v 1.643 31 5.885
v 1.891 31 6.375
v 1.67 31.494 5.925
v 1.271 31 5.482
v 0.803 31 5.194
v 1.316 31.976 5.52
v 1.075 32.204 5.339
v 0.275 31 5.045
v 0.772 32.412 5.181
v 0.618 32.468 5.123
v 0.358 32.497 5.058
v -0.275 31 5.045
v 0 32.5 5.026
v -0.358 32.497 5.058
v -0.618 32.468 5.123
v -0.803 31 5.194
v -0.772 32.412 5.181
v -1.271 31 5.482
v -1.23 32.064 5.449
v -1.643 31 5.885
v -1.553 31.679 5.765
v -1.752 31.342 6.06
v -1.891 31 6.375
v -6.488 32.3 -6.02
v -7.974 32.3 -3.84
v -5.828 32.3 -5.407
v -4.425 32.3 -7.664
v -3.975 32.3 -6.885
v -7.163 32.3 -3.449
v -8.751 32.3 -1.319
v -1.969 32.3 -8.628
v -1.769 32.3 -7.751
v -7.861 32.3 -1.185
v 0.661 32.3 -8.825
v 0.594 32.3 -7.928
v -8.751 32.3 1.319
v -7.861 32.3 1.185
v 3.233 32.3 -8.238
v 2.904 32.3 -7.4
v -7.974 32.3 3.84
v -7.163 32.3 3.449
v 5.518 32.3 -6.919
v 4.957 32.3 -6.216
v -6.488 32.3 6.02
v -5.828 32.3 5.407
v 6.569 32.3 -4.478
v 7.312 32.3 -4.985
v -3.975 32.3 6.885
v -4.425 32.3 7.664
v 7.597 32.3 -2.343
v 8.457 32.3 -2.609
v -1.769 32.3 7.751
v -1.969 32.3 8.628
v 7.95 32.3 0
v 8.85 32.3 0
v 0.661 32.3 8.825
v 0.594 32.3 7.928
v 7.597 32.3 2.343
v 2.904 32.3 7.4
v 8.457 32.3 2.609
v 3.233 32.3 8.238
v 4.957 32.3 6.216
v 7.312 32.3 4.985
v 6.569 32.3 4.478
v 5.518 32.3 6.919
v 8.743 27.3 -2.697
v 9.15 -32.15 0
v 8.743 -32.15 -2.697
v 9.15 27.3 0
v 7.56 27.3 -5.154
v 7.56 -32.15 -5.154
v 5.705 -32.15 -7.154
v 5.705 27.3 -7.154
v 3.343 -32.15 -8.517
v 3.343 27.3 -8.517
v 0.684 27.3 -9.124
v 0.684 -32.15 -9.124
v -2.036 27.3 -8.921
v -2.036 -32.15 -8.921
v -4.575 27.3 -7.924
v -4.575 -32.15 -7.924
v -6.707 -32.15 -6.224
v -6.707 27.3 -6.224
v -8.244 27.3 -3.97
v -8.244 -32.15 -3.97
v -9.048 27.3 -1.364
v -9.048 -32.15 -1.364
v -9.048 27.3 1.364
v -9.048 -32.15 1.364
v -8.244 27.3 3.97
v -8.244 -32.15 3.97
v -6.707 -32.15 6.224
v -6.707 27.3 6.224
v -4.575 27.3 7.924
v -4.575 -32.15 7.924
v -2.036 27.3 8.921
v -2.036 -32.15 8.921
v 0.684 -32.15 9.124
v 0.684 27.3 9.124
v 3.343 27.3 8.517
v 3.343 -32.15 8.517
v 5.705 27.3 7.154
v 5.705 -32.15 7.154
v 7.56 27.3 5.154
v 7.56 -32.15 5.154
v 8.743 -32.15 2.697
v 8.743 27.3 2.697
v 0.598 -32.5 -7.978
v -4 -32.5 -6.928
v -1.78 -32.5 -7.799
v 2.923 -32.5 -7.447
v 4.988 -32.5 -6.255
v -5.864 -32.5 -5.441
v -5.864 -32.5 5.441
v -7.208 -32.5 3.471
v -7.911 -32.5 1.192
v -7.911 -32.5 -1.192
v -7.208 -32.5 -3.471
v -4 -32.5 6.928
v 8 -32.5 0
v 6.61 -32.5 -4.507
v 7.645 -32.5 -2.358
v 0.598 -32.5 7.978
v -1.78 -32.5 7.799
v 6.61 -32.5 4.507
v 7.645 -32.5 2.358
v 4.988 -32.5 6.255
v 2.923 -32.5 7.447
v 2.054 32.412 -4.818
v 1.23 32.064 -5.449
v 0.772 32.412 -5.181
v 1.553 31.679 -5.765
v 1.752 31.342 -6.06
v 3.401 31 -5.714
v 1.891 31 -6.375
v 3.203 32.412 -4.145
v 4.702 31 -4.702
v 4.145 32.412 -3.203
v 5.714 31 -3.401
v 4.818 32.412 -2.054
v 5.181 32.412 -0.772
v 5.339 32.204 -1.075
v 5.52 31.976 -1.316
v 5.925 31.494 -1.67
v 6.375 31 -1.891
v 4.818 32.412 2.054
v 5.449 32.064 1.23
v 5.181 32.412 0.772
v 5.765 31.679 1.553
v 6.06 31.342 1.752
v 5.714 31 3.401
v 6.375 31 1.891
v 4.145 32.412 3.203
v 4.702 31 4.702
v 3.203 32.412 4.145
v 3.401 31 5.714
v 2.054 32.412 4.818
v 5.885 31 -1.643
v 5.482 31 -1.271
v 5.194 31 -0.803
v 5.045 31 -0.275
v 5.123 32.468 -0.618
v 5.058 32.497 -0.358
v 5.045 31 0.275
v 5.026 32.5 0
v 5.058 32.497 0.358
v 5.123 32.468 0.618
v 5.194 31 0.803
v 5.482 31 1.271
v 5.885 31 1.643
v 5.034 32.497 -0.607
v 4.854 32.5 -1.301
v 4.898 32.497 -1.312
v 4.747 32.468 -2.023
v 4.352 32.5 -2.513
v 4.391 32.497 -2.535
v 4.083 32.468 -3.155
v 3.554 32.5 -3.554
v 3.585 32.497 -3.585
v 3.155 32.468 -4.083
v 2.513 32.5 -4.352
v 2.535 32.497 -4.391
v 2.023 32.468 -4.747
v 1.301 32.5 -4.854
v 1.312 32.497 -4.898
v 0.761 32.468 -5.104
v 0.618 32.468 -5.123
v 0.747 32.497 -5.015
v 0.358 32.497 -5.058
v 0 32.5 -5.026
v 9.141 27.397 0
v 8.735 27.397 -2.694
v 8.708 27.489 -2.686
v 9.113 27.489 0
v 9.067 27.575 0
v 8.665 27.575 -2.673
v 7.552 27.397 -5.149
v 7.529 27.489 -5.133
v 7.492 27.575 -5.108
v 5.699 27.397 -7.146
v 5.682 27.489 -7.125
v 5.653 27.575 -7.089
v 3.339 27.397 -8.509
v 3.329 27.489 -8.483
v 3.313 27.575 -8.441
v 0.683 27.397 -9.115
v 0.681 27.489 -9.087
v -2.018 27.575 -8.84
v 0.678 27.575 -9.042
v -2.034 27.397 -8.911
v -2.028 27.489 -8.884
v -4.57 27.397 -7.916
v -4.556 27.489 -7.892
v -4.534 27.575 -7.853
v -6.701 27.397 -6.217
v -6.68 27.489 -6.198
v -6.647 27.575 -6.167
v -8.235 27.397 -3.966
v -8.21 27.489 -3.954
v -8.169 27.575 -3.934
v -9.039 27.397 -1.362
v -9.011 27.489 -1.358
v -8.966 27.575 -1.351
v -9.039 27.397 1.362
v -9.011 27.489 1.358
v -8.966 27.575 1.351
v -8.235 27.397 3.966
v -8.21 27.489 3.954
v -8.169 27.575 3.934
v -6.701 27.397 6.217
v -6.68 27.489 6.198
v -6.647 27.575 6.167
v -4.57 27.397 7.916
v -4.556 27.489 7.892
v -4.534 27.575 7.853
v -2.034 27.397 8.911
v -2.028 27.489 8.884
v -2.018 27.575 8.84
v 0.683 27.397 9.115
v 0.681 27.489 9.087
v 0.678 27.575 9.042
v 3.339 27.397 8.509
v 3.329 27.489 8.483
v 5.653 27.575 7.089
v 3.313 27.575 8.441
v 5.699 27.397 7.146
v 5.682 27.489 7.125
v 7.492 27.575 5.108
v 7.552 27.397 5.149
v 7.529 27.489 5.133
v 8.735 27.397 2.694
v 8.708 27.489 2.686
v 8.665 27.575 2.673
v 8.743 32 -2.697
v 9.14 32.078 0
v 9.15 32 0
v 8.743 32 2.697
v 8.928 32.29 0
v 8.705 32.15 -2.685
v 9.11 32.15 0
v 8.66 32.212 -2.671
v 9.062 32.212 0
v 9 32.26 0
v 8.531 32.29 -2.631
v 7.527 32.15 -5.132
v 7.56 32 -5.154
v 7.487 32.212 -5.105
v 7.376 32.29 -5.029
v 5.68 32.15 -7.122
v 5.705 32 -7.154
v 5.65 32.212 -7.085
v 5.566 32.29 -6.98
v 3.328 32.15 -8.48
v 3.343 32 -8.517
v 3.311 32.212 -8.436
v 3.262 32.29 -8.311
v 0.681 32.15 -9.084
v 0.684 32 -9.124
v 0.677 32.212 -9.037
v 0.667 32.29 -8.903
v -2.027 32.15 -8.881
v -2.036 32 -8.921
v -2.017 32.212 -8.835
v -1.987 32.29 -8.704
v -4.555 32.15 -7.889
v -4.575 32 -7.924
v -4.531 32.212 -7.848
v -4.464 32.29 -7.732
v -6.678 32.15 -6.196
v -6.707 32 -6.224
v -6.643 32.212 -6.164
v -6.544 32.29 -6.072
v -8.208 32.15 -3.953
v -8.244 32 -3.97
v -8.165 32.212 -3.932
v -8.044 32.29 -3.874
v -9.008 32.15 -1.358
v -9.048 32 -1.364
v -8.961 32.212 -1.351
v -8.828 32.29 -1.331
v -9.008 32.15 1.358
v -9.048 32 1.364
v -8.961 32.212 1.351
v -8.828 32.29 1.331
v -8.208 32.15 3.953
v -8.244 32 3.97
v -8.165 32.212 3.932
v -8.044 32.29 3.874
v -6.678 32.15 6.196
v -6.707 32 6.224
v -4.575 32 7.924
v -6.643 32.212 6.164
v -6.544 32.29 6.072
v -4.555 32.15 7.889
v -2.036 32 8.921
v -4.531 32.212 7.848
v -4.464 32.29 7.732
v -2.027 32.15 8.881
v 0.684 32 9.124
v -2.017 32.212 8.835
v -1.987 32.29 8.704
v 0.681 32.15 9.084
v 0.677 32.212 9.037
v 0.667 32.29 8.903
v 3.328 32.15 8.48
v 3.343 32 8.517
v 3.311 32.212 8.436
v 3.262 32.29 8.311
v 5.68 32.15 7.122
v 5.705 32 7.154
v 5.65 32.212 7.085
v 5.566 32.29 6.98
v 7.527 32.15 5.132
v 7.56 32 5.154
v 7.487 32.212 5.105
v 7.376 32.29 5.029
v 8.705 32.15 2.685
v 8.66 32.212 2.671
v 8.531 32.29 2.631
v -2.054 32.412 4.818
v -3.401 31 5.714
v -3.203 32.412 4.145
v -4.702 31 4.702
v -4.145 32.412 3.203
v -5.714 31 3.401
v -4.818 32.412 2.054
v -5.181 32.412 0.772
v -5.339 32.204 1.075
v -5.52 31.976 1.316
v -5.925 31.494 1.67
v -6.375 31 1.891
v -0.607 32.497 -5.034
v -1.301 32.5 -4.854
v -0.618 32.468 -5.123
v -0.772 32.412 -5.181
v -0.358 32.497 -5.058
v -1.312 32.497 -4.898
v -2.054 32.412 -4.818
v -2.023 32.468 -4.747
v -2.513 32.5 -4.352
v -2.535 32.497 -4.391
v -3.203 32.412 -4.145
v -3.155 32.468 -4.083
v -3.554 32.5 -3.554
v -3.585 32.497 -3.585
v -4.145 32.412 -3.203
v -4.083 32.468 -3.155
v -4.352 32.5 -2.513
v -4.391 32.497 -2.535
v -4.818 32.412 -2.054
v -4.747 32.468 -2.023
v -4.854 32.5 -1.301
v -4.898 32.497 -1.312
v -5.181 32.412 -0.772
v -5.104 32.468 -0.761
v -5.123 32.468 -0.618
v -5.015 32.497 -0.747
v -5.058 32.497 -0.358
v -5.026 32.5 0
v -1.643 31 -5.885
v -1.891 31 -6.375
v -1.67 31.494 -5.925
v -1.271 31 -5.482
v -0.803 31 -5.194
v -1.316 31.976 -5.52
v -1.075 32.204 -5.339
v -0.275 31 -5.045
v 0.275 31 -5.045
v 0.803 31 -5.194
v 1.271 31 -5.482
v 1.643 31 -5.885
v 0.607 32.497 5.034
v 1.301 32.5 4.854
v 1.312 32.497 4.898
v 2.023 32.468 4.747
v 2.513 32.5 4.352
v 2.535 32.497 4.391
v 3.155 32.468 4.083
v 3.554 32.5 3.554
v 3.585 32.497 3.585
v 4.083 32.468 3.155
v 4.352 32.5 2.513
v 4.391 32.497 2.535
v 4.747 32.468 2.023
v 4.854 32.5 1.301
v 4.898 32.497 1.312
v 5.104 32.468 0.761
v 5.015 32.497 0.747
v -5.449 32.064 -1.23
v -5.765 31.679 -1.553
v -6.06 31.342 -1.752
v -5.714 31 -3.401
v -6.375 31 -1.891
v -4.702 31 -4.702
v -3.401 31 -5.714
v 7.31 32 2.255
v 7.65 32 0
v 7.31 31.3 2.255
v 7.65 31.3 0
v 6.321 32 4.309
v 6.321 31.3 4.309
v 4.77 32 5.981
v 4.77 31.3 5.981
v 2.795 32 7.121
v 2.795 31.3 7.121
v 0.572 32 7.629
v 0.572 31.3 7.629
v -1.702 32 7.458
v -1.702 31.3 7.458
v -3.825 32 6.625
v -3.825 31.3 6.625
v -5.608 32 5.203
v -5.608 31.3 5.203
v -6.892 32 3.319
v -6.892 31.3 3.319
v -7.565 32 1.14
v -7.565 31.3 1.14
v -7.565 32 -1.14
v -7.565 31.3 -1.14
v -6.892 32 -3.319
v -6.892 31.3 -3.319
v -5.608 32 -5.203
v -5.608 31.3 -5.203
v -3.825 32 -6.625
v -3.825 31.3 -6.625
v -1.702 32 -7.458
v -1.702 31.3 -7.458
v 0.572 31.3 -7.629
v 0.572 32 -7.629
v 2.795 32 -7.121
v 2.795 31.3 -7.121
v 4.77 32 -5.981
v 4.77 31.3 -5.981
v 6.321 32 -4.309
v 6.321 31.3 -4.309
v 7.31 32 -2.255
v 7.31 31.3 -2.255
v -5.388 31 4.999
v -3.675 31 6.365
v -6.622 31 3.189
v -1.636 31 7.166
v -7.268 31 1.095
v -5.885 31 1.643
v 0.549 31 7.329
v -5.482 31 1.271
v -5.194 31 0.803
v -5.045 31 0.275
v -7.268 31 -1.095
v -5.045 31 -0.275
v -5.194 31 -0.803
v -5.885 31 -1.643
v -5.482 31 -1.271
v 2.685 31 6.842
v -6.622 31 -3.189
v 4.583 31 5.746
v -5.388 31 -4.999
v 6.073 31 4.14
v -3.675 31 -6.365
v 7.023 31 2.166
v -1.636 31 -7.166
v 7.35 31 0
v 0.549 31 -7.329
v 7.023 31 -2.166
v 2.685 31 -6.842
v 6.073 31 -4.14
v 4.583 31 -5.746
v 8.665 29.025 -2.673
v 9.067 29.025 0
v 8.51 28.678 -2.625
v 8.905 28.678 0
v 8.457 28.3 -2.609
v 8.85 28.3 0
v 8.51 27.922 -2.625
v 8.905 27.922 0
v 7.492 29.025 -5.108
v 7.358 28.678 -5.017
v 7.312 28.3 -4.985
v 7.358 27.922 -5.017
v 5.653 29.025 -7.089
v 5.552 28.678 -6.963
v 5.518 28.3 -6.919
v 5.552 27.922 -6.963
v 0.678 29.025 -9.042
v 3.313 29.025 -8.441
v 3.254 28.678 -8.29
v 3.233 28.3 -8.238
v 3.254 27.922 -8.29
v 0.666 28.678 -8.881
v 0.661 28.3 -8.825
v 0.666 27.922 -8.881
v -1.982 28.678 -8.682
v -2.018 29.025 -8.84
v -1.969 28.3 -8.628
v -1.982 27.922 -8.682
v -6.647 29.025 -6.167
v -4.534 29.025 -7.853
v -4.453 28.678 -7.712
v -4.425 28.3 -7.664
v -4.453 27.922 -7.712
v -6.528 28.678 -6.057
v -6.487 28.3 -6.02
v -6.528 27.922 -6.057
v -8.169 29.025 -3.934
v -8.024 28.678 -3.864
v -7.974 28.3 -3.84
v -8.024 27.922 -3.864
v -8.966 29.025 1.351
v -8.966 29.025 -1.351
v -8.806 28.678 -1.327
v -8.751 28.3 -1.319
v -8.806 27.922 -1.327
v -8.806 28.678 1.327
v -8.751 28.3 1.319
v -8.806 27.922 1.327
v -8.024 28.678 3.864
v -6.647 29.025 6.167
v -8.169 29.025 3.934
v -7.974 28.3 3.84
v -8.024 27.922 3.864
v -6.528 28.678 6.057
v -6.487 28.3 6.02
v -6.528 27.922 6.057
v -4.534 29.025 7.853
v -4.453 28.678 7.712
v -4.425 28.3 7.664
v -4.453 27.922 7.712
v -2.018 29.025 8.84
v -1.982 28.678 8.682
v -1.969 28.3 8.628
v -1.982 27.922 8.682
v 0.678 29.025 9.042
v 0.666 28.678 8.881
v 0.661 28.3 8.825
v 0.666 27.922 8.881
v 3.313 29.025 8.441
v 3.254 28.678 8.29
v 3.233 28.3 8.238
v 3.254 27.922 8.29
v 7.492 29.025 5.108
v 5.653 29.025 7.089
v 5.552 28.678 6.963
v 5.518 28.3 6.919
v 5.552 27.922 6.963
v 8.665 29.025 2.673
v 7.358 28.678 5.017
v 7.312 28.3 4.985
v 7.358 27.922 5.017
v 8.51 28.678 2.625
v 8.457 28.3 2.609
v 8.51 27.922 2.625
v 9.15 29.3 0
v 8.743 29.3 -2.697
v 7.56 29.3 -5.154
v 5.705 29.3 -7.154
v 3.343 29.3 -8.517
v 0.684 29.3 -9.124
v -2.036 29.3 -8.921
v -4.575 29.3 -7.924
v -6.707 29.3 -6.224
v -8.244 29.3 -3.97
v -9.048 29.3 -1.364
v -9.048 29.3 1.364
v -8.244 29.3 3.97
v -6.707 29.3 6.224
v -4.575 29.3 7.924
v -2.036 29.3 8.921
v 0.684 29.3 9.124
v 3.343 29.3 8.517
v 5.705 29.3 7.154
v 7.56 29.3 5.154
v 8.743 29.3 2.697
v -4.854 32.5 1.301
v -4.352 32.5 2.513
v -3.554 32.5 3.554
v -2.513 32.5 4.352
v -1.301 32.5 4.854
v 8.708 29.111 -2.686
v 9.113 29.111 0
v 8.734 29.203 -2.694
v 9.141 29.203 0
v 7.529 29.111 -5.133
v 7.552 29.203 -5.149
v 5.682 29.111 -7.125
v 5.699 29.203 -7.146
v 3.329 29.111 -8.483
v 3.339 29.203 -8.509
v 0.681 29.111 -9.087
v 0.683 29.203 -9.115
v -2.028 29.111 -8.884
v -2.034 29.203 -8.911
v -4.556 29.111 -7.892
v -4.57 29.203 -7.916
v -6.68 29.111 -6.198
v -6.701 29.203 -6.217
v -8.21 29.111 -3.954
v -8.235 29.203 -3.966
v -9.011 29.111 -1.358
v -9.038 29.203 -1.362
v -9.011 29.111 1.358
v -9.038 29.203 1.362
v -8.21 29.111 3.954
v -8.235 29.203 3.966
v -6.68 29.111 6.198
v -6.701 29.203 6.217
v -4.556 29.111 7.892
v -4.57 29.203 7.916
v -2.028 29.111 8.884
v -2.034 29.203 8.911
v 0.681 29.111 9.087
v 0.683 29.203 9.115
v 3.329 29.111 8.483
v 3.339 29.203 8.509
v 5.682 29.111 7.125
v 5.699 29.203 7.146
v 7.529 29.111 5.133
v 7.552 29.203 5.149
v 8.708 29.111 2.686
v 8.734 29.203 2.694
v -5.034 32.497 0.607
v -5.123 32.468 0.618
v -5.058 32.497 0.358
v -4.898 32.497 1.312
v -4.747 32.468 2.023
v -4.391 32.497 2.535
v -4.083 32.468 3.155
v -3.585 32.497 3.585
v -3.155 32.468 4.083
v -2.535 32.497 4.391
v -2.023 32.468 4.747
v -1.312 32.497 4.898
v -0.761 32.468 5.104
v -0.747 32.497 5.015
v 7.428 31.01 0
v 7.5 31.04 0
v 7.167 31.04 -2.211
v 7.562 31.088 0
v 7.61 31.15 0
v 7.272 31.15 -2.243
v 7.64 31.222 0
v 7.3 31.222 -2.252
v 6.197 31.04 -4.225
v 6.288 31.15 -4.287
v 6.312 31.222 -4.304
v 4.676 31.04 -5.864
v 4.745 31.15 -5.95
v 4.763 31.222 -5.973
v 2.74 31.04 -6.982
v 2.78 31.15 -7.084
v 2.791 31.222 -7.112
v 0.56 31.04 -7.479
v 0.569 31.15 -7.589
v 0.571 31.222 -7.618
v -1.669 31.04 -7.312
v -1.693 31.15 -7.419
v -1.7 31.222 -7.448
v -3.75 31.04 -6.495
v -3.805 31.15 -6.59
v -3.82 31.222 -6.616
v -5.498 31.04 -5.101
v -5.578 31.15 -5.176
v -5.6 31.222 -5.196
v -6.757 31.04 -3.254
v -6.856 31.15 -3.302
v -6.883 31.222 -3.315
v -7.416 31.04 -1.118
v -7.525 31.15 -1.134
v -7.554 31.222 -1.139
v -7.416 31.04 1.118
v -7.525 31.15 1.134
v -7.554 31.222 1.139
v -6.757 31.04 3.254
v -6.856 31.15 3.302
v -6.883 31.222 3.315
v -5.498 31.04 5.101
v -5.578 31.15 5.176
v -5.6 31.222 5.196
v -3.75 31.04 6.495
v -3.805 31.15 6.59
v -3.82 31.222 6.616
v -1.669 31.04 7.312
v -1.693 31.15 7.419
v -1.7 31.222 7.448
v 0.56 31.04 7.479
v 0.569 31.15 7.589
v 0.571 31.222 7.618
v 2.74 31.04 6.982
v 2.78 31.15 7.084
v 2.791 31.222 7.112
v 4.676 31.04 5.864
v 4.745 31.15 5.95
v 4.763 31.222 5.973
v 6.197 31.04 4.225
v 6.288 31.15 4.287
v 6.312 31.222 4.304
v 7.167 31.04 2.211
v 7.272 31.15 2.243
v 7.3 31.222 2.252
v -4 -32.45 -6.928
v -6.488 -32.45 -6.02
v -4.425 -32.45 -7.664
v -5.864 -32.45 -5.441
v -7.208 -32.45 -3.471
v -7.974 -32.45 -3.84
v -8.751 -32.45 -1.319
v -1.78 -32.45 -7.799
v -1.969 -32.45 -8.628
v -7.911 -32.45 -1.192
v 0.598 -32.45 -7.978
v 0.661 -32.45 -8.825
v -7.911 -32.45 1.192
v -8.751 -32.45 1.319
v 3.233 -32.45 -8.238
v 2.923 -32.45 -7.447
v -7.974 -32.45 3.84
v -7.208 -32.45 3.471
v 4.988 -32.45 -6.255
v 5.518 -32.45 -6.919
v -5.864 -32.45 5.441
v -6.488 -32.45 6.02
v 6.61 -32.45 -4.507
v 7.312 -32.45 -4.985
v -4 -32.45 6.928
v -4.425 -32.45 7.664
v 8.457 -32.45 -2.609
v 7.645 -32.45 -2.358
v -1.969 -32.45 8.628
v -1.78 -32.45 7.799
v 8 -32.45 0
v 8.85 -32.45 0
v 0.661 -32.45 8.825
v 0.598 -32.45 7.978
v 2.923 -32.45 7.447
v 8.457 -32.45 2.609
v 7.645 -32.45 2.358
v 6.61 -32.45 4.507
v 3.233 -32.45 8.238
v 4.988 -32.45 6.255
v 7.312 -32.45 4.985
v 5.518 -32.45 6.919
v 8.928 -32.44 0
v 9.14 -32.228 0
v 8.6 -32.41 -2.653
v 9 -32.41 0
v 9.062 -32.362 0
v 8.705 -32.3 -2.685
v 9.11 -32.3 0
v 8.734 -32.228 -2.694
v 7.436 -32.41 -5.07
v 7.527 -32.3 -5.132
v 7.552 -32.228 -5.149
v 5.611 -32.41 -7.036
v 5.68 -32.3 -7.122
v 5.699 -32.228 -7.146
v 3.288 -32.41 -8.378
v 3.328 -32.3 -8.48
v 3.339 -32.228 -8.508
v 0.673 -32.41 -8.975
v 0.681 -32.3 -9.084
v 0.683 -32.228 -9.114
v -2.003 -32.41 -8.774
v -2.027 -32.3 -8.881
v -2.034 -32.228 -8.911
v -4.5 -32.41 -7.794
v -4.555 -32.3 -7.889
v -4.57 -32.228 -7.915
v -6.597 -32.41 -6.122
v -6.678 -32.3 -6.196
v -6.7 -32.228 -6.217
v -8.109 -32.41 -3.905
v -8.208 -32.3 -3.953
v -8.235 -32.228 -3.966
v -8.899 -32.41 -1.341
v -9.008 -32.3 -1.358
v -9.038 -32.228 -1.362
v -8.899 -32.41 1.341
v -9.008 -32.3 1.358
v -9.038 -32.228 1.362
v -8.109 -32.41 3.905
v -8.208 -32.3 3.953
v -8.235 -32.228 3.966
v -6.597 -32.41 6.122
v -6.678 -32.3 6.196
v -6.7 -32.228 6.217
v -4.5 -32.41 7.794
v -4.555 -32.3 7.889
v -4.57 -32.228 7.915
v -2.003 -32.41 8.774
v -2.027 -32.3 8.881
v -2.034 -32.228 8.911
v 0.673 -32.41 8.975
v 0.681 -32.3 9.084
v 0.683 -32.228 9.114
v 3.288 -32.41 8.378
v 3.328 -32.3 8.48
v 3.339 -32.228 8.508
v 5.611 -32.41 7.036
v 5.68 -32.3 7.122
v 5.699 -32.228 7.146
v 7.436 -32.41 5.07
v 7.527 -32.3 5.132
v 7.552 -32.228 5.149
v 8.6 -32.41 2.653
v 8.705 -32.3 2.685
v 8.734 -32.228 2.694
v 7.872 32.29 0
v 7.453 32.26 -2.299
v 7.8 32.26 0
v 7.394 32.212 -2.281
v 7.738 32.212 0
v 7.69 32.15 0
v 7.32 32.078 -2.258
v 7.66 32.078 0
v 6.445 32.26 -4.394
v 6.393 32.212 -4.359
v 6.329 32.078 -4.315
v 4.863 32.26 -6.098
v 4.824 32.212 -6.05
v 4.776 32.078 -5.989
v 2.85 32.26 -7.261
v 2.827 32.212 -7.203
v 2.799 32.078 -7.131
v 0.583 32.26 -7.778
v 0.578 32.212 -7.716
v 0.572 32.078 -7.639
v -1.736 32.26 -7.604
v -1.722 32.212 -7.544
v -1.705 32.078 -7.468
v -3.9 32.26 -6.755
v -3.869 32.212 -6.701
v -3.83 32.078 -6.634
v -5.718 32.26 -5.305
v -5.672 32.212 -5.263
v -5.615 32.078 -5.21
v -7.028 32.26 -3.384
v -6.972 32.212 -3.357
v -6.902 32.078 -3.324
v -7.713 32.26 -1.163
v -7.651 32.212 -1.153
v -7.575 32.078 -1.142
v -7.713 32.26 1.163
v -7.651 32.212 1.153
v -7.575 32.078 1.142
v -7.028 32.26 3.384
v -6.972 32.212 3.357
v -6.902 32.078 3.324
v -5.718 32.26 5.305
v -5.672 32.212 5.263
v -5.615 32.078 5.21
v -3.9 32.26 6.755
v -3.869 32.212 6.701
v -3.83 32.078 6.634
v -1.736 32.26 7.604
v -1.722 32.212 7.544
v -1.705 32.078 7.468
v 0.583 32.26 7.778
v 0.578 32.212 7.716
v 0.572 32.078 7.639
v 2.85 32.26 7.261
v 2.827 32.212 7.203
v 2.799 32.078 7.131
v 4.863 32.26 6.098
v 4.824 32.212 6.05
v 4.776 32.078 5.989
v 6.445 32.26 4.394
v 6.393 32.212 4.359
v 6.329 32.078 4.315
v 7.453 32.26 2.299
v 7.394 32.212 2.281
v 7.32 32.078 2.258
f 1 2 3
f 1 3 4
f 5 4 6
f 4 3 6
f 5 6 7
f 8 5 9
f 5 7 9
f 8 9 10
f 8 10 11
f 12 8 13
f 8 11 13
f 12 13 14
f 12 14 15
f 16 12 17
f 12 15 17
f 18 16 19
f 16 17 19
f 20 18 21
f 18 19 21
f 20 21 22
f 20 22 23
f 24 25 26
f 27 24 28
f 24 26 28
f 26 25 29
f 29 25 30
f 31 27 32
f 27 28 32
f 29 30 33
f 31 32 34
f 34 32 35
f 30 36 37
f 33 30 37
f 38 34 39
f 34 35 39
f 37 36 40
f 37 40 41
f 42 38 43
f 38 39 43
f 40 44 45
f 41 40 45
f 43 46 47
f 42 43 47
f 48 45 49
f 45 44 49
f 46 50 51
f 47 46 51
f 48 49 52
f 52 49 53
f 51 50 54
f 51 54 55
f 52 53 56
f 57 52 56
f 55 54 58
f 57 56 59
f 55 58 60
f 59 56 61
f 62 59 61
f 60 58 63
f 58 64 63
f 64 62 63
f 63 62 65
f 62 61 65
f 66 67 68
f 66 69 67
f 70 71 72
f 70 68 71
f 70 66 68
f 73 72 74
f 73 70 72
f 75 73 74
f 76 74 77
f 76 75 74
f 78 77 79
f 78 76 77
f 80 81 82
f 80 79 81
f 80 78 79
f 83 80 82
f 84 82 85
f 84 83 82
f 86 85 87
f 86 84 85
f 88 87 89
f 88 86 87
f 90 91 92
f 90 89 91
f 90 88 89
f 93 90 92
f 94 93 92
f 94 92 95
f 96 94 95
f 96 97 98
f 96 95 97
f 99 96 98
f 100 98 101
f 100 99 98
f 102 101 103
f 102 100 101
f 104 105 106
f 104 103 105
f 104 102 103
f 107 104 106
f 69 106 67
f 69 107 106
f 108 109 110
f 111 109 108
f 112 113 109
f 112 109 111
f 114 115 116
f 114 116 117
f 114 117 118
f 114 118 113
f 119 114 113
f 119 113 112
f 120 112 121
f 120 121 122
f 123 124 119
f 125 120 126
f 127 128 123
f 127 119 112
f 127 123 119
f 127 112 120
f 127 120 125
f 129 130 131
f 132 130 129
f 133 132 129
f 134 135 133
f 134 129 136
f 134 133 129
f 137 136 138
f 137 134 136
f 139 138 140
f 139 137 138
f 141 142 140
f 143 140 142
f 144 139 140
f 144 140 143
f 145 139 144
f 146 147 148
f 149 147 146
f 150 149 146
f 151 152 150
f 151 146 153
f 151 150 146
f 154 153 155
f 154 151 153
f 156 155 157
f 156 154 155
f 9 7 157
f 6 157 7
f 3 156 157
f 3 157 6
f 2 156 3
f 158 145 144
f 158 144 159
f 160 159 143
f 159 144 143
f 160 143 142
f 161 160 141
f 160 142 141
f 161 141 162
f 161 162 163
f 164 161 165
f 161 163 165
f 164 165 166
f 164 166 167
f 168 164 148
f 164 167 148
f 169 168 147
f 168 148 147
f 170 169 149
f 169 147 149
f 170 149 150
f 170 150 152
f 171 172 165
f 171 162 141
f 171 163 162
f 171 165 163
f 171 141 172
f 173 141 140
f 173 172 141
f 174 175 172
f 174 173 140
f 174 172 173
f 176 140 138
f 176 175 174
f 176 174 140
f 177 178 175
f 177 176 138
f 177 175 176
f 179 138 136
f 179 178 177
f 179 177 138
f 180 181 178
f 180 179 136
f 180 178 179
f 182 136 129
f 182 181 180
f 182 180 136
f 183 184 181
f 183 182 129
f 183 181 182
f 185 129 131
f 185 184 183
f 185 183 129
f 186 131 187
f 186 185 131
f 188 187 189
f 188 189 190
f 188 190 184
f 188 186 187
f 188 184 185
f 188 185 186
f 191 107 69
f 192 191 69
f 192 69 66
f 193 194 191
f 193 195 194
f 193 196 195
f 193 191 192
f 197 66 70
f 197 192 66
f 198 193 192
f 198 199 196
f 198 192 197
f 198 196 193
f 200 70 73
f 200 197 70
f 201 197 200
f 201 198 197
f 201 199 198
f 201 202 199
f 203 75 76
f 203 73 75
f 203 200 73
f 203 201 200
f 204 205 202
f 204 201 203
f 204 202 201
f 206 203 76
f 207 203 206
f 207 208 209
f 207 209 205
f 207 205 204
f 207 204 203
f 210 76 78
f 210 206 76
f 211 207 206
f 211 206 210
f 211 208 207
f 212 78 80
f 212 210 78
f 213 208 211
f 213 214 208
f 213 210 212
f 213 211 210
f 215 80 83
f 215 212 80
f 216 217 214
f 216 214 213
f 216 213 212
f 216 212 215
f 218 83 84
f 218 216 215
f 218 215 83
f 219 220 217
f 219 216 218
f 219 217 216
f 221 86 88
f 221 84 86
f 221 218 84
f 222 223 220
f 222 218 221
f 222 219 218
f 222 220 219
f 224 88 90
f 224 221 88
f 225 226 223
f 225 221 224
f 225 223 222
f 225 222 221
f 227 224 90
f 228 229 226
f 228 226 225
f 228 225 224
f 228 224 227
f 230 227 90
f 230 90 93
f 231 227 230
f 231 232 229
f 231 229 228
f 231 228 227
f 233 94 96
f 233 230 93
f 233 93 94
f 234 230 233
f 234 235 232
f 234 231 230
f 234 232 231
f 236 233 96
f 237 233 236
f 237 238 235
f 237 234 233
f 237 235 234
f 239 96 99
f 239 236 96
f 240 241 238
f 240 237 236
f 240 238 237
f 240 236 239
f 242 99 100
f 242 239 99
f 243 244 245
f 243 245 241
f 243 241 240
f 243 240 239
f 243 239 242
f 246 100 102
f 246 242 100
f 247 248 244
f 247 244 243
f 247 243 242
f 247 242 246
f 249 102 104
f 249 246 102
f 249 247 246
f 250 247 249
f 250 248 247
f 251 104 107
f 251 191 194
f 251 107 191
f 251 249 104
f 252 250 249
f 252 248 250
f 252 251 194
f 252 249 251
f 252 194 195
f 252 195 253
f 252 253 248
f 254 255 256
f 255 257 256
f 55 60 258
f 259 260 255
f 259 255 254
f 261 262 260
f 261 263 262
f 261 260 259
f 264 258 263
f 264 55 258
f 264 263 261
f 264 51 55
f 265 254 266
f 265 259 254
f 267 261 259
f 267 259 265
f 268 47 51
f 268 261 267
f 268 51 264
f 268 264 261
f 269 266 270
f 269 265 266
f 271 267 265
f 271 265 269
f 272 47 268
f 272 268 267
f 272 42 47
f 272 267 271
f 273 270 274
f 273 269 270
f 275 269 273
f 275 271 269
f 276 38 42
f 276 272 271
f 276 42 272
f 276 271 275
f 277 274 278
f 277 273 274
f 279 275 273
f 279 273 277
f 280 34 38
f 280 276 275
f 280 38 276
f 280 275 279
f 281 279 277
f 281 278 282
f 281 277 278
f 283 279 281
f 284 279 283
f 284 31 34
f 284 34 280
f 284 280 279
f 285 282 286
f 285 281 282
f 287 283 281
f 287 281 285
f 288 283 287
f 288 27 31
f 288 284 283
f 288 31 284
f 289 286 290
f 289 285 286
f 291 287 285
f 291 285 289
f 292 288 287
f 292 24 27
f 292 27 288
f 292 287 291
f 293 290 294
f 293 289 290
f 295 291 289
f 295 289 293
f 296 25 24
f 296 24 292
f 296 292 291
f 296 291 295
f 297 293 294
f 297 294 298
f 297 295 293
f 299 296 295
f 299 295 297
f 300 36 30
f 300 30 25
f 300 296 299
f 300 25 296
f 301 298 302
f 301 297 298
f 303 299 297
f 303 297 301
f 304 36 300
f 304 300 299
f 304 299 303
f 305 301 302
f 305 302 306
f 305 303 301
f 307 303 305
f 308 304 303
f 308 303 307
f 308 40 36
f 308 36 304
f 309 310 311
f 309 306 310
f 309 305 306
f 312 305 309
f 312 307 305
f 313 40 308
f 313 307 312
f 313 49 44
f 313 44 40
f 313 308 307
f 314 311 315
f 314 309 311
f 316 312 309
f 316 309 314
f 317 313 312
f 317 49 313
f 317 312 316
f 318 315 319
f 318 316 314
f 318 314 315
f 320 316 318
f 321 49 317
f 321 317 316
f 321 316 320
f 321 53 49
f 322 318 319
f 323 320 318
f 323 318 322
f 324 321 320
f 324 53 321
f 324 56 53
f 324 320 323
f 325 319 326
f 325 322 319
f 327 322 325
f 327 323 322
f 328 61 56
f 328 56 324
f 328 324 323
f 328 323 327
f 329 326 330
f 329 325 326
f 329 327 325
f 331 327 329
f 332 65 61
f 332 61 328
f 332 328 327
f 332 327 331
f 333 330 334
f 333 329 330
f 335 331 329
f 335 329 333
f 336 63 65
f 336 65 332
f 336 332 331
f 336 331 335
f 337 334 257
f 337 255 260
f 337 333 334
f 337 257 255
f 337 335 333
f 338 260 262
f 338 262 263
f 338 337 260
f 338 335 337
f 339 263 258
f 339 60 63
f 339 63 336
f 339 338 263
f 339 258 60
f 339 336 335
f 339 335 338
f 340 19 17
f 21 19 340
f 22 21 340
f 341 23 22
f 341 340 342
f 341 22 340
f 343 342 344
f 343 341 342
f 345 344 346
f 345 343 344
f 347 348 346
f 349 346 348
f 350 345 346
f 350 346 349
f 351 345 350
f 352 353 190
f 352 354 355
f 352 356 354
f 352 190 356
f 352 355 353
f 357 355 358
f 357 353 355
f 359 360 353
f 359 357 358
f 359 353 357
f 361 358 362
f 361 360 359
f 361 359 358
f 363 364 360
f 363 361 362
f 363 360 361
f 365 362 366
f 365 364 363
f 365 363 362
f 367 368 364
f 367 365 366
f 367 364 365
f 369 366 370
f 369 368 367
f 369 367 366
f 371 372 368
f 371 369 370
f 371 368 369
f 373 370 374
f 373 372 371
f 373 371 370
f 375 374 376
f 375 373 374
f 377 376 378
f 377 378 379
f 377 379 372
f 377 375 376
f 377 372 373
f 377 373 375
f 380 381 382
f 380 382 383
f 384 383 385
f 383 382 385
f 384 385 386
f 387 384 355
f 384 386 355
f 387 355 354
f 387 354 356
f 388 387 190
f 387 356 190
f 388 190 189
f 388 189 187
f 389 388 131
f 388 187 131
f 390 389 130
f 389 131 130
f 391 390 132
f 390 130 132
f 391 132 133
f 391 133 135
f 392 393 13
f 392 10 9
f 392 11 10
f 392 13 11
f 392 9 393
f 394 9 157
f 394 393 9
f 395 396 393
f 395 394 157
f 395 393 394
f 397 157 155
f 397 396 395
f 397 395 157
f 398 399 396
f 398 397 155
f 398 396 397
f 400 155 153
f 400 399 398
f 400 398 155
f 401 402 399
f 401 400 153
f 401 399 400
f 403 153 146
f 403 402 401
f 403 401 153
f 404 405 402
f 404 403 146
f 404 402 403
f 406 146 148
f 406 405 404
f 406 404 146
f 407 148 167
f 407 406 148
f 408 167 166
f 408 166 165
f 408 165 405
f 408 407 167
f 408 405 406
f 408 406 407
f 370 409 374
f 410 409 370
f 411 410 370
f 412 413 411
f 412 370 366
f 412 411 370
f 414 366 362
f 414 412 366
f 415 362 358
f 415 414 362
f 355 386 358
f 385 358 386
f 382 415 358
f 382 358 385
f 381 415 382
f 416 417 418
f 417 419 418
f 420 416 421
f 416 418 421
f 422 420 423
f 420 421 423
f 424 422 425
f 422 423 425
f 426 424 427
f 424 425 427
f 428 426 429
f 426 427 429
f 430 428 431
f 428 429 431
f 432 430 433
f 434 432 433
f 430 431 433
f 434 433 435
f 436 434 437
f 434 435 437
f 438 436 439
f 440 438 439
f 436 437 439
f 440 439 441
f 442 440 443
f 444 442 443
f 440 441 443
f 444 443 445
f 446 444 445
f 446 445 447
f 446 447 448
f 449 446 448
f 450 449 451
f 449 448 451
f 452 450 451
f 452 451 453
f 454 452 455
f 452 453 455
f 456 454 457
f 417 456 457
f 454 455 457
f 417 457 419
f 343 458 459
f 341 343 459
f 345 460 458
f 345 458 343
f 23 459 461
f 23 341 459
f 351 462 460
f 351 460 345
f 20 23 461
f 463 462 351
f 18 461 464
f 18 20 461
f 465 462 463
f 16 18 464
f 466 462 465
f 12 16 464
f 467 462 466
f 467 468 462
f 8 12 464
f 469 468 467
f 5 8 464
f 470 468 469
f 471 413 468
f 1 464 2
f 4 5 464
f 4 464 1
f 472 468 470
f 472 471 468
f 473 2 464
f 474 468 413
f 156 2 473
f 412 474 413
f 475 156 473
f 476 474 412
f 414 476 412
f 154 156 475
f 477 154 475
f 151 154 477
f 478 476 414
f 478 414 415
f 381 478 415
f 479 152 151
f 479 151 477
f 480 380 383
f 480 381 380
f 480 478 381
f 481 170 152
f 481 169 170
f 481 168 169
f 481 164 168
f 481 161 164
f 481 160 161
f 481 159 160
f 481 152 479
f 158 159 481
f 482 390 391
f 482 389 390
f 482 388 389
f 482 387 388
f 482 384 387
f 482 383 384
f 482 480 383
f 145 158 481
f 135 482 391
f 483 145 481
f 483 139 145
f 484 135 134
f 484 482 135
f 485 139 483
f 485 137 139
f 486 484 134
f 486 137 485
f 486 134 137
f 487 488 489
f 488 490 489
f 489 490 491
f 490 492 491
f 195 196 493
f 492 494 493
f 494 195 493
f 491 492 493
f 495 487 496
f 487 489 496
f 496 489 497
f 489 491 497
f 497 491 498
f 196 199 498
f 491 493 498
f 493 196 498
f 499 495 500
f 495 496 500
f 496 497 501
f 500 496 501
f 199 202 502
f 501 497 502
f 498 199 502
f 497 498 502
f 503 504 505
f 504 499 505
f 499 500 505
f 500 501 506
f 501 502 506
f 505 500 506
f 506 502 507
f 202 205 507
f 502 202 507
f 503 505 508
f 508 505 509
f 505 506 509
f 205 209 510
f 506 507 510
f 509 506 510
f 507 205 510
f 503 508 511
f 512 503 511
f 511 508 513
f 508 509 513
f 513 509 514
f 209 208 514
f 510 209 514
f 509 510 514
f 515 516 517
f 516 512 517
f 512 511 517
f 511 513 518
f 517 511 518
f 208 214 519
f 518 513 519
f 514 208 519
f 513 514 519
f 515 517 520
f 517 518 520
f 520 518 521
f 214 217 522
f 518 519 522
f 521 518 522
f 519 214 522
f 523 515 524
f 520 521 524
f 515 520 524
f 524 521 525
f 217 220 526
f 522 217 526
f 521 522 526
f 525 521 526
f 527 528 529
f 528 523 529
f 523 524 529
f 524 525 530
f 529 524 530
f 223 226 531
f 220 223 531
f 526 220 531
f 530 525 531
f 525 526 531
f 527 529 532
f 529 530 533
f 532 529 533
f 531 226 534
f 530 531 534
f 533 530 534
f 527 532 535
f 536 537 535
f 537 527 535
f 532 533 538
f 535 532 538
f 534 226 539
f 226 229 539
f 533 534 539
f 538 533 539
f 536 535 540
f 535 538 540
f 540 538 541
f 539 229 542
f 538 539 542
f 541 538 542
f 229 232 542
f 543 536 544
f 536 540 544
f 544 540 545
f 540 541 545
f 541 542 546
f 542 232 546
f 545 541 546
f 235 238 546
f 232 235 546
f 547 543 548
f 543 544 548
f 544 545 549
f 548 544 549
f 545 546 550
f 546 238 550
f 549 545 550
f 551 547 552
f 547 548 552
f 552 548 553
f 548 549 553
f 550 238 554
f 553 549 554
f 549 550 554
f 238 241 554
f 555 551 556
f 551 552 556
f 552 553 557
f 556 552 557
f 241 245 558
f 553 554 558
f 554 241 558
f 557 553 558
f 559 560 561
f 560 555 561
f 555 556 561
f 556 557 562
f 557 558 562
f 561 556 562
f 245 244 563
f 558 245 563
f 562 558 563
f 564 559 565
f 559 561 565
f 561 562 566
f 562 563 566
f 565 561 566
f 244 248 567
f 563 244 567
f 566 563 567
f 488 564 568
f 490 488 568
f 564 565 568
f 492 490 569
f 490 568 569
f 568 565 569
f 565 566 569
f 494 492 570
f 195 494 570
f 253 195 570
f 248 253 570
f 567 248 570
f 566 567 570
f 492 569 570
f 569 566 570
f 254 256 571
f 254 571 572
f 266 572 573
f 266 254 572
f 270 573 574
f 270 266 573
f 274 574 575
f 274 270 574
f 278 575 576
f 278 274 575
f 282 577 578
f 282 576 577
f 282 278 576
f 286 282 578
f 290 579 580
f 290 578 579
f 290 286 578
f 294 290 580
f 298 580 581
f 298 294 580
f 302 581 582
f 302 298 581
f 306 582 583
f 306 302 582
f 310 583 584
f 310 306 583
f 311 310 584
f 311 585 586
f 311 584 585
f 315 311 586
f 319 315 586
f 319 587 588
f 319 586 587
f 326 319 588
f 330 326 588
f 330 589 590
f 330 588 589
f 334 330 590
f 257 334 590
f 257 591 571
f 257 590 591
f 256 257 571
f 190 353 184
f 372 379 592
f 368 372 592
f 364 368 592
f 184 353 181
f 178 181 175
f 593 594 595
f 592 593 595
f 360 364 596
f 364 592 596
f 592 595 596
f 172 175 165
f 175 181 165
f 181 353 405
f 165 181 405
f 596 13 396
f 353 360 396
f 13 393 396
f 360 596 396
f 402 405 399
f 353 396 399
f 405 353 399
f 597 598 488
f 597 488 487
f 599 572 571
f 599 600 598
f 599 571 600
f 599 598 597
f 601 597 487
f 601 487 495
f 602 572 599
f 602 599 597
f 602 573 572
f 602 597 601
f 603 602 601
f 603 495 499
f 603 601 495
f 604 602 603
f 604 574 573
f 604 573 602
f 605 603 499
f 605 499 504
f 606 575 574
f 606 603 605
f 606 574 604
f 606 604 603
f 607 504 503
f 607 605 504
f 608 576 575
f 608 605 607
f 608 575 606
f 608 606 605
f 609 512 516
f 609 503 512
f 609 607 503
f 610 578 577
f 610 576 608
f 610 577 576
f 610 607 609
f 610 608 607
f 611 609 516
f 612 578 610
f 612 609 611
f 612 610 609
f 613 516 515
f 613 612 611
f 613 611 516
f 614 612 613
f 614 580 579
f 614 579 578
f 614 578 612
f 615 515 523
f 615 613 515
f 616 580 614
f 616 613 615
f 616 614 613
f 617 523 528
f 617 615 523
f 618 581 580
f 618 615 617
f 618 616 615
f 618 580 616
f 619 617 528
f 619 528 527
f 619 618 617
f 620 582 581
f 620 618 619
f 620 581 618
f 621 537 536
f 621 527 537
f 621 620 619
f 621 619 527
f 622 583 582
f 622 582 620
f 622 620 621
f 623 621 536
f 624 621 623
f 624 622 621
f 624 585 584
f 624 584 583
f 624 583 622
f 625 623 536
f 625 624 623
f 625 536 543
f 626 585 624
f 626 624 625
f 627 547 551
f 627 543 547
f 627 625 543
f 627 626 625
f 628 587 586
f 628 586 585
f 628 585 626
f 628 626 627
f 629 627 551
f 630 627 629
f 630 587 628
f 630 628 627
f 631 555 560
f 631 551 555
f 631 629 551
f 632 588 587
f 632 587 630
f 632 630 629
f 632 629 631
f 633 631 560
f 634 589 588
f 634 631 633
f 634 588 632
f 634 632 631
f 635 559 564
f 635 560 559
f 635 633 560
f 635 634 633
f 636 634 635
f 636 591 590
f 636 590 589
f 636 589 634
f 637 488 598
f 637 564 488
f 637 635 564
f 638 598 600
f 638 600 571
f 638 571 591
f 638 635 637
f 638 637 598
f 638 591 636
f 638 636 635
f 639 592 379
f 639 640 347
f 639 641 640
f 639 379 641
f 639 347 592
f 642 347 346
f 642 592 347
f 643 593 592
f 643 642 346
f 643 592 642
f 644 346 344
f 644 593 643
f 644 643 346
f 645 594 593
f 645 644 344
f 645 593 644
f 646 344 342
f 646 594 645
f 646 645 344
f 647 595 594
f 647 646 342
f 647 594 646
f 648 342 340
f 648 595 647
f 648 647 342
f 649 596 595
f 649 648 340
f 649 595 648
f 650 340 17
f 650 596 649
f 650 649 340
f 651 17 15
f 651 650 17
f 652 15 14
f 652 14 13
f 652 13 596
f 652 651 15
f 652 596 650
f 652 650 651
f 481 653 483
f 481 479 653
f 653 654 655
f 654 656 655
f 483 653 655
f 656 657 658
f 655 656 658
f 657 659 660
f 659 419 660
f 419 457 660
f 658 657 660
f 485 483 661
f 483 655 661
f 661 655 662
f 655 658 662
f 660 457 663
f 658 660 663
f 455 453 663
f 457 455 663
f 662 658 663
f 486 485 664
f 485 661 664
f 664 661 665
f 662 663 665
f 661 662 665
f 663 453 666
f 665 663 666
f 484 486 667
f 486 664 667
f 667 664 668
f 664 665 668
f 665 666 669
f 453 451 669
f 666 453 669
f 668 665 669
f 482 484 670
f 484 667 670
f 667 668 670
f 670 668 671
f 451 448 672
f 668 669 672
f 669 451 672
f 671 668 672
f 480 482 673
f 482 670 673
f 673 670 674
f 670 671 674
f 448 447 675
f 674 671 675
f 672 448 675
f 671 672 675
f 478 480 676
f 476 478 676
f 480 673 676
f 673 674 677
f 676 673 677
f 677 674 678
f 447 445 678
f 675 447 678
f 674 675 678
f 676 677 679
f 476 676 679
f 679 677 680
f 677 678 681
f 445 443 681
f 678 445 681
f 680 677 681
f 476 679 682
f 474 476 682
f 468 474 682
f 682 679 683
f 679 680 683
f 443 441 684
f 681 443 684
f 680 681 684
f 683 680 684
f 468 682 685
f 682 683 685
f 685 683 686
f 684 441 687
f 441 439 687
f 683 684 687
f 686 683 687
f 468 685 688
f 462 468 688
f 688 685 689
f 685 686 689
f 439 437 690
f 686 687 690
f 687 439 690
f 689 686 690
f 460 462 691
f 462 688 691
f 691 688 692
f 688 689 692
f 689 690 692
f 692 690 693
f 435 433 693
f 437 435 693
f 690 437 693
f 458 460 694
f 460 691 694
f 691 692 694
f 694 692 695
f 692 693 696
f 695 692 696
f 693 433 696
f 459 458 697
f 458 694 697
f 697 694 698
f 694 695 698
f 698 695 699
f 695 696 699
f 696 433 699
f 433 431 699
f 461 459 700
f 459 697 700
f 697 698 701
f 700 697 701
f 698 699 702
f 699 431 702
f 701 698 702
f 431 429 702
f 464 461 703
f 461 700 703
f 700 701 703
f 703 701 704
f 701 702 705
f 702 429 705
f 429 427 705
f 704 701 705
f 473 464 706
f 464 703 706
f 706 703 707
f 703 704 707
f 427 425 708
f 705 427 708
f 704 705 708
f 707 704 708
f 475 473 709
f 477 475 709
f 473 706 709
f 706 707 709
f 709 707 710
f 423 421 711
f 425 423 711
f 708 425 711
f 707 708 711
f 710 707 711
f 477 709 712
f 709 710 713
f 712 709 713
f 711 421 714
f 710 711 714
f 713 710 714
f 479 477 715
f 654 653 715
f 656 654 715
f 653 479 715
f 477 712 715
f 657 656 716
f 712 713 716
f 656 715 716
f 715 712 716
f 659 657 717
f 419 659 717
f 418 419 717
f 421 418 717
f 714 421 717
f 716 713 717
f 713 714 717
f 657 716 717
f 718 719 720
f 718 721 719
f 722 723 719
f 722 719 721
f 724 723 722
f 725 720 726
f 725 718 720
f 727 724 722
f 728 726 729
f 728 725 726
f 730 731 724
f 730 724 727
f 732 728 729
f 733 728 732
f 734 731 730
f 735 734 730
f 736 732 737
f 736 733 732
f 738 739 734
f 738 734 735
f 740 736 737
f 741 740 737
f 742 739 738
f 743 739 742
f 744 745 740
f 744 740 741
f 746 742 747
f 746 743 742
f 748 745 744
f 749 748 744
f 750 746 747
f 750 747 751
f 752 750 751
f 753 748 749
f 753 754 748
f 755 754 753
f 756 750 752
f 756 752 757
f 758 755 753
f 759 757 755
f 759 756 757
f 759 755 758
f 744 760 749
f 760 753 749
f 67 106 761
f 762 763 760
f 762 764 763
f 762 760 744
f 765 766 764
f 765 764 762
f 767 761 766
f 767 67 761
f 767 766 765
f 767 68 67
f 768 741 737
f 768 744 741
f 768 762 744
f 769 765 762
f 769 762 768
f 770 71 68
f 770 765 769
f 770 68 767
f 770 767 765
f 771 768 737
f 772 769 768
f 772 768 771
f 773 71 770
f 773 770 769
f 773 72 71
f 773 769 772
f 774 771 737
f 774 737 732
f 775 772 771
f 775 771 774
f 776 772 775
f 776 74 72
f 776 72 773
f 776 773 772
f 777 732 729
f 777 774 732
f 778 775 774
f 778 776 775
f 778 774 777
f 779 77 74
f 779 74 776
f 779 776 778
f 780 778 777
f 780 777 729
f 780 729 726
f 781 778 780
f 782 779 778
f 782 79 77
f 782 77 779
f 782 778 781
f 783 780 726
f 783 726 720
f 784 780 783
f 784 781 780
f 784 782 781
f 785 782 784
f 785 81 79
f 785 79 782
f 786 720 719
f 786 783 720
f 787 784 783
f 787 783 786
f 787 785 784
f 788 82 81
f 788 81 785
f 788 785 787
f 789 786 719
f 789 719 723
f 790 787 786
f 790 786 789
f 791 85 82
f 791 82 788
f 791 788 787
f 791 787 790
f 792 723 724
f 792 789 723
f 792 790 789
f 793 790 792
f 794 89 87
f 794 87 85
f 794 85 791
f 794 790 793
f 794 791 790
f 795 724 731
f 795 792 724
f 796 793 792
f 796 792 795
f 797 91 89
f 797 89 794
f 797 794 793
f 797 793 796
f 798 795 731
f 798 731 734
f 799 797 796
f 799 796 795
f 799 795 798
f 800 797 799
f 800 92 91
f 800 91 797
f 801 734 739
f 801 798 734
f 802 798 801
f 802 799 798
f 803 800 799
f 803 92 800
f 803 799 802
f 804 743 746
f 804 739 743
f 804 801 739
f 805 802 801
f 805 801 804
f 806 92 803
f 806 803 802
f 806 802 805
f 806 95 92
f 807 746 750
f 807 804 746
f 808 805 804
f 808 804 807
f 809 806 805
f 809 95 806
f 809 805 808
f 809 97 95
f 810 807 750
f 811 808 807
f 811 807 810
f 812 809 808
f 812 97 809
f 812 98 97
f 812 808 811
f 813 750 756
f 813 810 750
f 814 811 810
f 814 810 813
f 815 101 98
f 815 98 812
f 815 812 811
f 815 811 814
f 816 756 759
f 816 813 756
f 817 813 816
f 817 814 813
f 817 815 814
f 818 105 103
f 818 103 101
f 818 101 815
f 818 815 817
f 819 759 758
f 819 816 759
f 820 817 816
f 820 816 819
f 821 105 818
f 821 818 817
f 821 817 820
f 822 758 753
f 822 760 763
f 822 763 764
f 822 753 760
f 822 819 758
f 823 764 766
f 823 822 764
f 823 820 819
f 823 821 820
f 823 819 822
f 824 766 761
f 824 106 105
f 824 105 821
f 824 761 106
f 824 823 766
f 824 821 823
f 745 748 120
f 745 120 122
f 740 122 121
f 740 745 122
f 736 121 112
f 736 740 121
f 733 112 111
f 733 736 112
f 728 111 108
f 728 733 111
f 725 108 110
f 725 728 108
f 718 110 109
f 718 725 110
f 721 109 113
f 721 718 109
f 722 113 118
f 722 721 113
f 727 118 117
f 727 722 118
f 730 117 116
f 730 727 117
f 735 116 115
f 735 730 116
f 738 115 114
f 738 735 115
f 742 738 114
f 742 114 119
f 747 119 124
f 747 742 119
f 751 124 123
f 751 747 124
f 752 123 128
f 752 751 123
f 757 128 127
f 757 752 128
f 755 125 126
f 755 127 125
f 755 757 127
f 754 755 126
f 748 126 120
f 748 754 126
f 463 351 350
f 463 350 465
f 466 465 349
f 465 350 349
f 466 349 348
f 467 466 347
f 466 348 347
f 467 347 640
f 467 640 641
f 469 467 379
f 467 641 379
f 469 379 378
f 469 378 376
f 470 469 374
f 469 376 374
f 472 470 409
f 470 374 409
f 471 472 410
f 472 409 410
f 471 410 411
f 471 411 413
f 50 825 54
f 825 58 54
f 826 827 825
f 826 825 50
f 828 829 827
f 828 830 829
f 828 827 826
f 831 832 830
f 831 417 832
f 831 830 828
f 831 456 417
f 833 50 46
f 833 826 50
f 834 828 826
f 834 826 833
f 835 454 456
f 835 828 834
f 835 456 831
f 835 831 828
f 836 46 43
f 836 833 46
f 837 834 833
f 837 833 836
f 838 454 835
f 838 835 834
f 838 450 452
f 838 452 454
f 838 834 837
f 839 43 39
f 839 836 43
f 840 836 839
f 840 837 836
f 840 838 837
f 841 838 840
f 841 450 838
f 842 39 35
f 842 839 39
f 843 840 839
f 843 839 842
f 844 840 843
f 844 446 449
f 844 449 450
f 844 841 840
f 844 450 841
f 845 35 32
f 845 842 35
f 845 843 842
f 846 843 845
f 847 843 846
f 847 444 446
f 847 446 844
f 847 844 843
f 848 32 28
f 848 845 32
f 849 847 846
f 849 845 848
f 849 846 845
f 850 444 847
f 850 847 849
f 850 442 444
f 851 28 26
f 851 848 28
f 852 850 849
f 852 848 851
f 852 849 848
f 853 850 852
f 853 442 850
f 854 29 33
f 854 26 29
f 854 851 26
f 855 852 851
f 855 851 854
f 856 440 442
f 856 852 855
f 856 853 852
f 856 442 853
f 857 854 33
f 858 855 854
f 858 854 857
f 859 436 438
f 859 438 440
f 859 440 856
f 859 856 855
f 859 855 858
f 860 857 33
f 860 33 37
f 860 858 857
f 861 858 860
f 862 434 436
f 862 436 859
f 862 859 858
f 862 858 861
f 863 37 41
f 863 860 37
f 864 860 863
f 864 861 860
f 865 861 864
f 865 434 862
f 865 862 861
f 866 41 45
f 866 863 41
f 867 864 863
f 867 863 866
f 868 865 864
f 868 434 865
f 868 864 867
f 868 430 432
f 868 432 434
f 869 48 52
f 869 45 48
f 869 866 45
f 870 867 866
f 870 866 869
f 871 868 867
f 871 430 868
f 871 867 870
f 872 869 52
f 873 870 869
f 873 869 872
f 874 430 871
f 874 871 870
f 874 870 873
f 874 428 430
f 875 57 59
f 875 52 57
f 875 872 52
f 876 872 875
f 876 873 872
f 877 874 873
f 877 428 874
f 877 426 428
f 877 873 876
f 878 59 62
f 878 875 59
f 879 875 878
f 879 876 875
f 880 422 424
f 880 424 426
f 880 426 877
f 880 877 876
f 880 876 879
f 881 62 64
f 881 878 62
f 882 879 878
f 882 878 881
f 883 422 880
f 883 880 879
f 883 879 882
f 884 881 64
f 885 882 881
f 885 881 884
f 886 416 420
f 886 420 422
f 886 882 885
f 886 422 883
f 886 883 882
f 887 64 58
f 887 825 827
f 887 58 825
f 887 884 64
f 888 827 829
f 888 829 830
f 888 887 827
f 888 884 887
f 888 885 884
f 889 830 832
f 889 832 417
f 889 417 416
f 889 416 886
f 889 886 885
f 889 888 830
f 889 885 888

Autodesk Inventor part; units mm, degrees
ref_plane "YZ Plane" through (0, 0, 0) normal (1, 0, 0) x (0, 1, 0)
ref_plane "XZ Plane" through (0, 0, 0) normal (0, 1, 0) x (-1, 0, 0)
ref_plane "XY Plane" through (0, 0, 0) normal (0, 0, 1) x (1, 0, 0)
sketch "Sketch1" plane through (0, 0, 0) normal (0, 0, 1) x (1, 0, 0)
  line L0 (0, 32.5) -> (0, -32.5)
  line L1 (9.15, -32.15) -> (9.15, 27.3)
  line L2 (9.15, 29.3) -> (9.15, 32)
  line L3 (8.85, 32.3) -> (7.95, 32.3)
  line L4 (7.65, 32) -> (7.65, 31.3)
  line L5 (7.35, 31) -> (6.65, 31)
  line L6 (6.65, 31) -> (5.2379, 32.4121)
  line L7 (5.0257, 32.5) -> (0, 32.5)
  arc A0 (8.85, -32.45) -> (9.15, -32.15) centre (8.85, -32.15) ccw
  arc A1 (9.15, 27.3) -> (9.0674, 27.5752) centre (8.65, 27.3) ccw
  arc A2 (9.0674, 29.0248) -> (9.15, 29.3) centre (8.65, 29.3) ccw
  arc A3 (9.15, 32) -> (8.85, 32.3) centre (8.85, 32) ccw
  arc A4 (5.2379, 32.4121) -> (5.0257, 32.5) centre (5.0257, 32.2) ccw
  arc A5 (7.95, 32.3) -> (7.65, 32) centre (7.95, 32) ccw
  arc A6 (7.35, 31) -> (7.65, 31.3) centre (7.35, 31.3) ccw
  arc A7 (9.0674, 29.0248) -> (9.0674, 27.5752) centre (10.1667, 28.3) ccw
  line L8 (8.85, -32.45) -> (8, -32.45)
  line L9 (0, -32.5) -> (8, -32.5)
  line L10 (8, -32.5) -> (8, -32.45)
  point P0 (0, 0)
  point P1 (9.15, 32.3)
  point P2 (7.65, 32.3)
  point P3 (7.65, 31)
  point P4 (0, 0)
  dimension "d0" = 65
  dimension "d1" = 18.3
  dimension "d2" = 0.2
  dimension "d3" = 1.5
  dimension "d4" = 1
  dimension "d5" = 135
  dimension "d6" = 1.3
  dimension "d9" = 0.3
  dimension "d19" = 0.3
  dimension "d20" = 0.5
  dimension "d21" = 4
  dimension "d22" = 2
  dimension "d23" = 0.05
  dimension "d24" = 16
revolve "Revolution1" add sketch "Sketch1" angle 360 about axis through (0, 32.5, 0) along (0, -1, 0)
sketch "Sketch2" plane through (0, 32.5, 0) normal (0, 1, 0) x (1, 0, 0)
  circle A0 centre (0, 0) radius 5.0257 projected
  circle A1 centre (0, 0) radius 7.35 projected
  circle A2 centre (0, 0) radius 7.65 projected
  circle A3 centre (0, 0) radius 7.65 projected
  circle A4 centre (0, 0) radius 7.65 projected
  circle A5 centre (0, 0) radius 7.65 projected
  line L0 (-2, -7.3839) -> (-2, -7.0257)
  line L1 (2, -7.0257) -> (2, -7.3839)
  arc A6 (2, -7.0257) -> (-2, -7.0257) centre (0, -7.0257) ccw
  circle A7 centre (0, 0) radius 7.35 projected
  arc A8 (-2, -7.0727) -> (2, -7.0727) centre (0, 0) ccw
  point P0 (0, 0)
  dimension "d11" = 4
extrude "Extrusion2" cut sketch "Sketch2" against normal up to surface (1.5 mm away) contours A6 L1 A1 L0 picked at (0, -6.5546)
pattern_circular "Circular Pattern1" count 4 over 360 about axis through (0, -10, 0) along (0, 1, 0) of "Extrusion2"
properties part number "Battery18650" material "Stainless Steel"
